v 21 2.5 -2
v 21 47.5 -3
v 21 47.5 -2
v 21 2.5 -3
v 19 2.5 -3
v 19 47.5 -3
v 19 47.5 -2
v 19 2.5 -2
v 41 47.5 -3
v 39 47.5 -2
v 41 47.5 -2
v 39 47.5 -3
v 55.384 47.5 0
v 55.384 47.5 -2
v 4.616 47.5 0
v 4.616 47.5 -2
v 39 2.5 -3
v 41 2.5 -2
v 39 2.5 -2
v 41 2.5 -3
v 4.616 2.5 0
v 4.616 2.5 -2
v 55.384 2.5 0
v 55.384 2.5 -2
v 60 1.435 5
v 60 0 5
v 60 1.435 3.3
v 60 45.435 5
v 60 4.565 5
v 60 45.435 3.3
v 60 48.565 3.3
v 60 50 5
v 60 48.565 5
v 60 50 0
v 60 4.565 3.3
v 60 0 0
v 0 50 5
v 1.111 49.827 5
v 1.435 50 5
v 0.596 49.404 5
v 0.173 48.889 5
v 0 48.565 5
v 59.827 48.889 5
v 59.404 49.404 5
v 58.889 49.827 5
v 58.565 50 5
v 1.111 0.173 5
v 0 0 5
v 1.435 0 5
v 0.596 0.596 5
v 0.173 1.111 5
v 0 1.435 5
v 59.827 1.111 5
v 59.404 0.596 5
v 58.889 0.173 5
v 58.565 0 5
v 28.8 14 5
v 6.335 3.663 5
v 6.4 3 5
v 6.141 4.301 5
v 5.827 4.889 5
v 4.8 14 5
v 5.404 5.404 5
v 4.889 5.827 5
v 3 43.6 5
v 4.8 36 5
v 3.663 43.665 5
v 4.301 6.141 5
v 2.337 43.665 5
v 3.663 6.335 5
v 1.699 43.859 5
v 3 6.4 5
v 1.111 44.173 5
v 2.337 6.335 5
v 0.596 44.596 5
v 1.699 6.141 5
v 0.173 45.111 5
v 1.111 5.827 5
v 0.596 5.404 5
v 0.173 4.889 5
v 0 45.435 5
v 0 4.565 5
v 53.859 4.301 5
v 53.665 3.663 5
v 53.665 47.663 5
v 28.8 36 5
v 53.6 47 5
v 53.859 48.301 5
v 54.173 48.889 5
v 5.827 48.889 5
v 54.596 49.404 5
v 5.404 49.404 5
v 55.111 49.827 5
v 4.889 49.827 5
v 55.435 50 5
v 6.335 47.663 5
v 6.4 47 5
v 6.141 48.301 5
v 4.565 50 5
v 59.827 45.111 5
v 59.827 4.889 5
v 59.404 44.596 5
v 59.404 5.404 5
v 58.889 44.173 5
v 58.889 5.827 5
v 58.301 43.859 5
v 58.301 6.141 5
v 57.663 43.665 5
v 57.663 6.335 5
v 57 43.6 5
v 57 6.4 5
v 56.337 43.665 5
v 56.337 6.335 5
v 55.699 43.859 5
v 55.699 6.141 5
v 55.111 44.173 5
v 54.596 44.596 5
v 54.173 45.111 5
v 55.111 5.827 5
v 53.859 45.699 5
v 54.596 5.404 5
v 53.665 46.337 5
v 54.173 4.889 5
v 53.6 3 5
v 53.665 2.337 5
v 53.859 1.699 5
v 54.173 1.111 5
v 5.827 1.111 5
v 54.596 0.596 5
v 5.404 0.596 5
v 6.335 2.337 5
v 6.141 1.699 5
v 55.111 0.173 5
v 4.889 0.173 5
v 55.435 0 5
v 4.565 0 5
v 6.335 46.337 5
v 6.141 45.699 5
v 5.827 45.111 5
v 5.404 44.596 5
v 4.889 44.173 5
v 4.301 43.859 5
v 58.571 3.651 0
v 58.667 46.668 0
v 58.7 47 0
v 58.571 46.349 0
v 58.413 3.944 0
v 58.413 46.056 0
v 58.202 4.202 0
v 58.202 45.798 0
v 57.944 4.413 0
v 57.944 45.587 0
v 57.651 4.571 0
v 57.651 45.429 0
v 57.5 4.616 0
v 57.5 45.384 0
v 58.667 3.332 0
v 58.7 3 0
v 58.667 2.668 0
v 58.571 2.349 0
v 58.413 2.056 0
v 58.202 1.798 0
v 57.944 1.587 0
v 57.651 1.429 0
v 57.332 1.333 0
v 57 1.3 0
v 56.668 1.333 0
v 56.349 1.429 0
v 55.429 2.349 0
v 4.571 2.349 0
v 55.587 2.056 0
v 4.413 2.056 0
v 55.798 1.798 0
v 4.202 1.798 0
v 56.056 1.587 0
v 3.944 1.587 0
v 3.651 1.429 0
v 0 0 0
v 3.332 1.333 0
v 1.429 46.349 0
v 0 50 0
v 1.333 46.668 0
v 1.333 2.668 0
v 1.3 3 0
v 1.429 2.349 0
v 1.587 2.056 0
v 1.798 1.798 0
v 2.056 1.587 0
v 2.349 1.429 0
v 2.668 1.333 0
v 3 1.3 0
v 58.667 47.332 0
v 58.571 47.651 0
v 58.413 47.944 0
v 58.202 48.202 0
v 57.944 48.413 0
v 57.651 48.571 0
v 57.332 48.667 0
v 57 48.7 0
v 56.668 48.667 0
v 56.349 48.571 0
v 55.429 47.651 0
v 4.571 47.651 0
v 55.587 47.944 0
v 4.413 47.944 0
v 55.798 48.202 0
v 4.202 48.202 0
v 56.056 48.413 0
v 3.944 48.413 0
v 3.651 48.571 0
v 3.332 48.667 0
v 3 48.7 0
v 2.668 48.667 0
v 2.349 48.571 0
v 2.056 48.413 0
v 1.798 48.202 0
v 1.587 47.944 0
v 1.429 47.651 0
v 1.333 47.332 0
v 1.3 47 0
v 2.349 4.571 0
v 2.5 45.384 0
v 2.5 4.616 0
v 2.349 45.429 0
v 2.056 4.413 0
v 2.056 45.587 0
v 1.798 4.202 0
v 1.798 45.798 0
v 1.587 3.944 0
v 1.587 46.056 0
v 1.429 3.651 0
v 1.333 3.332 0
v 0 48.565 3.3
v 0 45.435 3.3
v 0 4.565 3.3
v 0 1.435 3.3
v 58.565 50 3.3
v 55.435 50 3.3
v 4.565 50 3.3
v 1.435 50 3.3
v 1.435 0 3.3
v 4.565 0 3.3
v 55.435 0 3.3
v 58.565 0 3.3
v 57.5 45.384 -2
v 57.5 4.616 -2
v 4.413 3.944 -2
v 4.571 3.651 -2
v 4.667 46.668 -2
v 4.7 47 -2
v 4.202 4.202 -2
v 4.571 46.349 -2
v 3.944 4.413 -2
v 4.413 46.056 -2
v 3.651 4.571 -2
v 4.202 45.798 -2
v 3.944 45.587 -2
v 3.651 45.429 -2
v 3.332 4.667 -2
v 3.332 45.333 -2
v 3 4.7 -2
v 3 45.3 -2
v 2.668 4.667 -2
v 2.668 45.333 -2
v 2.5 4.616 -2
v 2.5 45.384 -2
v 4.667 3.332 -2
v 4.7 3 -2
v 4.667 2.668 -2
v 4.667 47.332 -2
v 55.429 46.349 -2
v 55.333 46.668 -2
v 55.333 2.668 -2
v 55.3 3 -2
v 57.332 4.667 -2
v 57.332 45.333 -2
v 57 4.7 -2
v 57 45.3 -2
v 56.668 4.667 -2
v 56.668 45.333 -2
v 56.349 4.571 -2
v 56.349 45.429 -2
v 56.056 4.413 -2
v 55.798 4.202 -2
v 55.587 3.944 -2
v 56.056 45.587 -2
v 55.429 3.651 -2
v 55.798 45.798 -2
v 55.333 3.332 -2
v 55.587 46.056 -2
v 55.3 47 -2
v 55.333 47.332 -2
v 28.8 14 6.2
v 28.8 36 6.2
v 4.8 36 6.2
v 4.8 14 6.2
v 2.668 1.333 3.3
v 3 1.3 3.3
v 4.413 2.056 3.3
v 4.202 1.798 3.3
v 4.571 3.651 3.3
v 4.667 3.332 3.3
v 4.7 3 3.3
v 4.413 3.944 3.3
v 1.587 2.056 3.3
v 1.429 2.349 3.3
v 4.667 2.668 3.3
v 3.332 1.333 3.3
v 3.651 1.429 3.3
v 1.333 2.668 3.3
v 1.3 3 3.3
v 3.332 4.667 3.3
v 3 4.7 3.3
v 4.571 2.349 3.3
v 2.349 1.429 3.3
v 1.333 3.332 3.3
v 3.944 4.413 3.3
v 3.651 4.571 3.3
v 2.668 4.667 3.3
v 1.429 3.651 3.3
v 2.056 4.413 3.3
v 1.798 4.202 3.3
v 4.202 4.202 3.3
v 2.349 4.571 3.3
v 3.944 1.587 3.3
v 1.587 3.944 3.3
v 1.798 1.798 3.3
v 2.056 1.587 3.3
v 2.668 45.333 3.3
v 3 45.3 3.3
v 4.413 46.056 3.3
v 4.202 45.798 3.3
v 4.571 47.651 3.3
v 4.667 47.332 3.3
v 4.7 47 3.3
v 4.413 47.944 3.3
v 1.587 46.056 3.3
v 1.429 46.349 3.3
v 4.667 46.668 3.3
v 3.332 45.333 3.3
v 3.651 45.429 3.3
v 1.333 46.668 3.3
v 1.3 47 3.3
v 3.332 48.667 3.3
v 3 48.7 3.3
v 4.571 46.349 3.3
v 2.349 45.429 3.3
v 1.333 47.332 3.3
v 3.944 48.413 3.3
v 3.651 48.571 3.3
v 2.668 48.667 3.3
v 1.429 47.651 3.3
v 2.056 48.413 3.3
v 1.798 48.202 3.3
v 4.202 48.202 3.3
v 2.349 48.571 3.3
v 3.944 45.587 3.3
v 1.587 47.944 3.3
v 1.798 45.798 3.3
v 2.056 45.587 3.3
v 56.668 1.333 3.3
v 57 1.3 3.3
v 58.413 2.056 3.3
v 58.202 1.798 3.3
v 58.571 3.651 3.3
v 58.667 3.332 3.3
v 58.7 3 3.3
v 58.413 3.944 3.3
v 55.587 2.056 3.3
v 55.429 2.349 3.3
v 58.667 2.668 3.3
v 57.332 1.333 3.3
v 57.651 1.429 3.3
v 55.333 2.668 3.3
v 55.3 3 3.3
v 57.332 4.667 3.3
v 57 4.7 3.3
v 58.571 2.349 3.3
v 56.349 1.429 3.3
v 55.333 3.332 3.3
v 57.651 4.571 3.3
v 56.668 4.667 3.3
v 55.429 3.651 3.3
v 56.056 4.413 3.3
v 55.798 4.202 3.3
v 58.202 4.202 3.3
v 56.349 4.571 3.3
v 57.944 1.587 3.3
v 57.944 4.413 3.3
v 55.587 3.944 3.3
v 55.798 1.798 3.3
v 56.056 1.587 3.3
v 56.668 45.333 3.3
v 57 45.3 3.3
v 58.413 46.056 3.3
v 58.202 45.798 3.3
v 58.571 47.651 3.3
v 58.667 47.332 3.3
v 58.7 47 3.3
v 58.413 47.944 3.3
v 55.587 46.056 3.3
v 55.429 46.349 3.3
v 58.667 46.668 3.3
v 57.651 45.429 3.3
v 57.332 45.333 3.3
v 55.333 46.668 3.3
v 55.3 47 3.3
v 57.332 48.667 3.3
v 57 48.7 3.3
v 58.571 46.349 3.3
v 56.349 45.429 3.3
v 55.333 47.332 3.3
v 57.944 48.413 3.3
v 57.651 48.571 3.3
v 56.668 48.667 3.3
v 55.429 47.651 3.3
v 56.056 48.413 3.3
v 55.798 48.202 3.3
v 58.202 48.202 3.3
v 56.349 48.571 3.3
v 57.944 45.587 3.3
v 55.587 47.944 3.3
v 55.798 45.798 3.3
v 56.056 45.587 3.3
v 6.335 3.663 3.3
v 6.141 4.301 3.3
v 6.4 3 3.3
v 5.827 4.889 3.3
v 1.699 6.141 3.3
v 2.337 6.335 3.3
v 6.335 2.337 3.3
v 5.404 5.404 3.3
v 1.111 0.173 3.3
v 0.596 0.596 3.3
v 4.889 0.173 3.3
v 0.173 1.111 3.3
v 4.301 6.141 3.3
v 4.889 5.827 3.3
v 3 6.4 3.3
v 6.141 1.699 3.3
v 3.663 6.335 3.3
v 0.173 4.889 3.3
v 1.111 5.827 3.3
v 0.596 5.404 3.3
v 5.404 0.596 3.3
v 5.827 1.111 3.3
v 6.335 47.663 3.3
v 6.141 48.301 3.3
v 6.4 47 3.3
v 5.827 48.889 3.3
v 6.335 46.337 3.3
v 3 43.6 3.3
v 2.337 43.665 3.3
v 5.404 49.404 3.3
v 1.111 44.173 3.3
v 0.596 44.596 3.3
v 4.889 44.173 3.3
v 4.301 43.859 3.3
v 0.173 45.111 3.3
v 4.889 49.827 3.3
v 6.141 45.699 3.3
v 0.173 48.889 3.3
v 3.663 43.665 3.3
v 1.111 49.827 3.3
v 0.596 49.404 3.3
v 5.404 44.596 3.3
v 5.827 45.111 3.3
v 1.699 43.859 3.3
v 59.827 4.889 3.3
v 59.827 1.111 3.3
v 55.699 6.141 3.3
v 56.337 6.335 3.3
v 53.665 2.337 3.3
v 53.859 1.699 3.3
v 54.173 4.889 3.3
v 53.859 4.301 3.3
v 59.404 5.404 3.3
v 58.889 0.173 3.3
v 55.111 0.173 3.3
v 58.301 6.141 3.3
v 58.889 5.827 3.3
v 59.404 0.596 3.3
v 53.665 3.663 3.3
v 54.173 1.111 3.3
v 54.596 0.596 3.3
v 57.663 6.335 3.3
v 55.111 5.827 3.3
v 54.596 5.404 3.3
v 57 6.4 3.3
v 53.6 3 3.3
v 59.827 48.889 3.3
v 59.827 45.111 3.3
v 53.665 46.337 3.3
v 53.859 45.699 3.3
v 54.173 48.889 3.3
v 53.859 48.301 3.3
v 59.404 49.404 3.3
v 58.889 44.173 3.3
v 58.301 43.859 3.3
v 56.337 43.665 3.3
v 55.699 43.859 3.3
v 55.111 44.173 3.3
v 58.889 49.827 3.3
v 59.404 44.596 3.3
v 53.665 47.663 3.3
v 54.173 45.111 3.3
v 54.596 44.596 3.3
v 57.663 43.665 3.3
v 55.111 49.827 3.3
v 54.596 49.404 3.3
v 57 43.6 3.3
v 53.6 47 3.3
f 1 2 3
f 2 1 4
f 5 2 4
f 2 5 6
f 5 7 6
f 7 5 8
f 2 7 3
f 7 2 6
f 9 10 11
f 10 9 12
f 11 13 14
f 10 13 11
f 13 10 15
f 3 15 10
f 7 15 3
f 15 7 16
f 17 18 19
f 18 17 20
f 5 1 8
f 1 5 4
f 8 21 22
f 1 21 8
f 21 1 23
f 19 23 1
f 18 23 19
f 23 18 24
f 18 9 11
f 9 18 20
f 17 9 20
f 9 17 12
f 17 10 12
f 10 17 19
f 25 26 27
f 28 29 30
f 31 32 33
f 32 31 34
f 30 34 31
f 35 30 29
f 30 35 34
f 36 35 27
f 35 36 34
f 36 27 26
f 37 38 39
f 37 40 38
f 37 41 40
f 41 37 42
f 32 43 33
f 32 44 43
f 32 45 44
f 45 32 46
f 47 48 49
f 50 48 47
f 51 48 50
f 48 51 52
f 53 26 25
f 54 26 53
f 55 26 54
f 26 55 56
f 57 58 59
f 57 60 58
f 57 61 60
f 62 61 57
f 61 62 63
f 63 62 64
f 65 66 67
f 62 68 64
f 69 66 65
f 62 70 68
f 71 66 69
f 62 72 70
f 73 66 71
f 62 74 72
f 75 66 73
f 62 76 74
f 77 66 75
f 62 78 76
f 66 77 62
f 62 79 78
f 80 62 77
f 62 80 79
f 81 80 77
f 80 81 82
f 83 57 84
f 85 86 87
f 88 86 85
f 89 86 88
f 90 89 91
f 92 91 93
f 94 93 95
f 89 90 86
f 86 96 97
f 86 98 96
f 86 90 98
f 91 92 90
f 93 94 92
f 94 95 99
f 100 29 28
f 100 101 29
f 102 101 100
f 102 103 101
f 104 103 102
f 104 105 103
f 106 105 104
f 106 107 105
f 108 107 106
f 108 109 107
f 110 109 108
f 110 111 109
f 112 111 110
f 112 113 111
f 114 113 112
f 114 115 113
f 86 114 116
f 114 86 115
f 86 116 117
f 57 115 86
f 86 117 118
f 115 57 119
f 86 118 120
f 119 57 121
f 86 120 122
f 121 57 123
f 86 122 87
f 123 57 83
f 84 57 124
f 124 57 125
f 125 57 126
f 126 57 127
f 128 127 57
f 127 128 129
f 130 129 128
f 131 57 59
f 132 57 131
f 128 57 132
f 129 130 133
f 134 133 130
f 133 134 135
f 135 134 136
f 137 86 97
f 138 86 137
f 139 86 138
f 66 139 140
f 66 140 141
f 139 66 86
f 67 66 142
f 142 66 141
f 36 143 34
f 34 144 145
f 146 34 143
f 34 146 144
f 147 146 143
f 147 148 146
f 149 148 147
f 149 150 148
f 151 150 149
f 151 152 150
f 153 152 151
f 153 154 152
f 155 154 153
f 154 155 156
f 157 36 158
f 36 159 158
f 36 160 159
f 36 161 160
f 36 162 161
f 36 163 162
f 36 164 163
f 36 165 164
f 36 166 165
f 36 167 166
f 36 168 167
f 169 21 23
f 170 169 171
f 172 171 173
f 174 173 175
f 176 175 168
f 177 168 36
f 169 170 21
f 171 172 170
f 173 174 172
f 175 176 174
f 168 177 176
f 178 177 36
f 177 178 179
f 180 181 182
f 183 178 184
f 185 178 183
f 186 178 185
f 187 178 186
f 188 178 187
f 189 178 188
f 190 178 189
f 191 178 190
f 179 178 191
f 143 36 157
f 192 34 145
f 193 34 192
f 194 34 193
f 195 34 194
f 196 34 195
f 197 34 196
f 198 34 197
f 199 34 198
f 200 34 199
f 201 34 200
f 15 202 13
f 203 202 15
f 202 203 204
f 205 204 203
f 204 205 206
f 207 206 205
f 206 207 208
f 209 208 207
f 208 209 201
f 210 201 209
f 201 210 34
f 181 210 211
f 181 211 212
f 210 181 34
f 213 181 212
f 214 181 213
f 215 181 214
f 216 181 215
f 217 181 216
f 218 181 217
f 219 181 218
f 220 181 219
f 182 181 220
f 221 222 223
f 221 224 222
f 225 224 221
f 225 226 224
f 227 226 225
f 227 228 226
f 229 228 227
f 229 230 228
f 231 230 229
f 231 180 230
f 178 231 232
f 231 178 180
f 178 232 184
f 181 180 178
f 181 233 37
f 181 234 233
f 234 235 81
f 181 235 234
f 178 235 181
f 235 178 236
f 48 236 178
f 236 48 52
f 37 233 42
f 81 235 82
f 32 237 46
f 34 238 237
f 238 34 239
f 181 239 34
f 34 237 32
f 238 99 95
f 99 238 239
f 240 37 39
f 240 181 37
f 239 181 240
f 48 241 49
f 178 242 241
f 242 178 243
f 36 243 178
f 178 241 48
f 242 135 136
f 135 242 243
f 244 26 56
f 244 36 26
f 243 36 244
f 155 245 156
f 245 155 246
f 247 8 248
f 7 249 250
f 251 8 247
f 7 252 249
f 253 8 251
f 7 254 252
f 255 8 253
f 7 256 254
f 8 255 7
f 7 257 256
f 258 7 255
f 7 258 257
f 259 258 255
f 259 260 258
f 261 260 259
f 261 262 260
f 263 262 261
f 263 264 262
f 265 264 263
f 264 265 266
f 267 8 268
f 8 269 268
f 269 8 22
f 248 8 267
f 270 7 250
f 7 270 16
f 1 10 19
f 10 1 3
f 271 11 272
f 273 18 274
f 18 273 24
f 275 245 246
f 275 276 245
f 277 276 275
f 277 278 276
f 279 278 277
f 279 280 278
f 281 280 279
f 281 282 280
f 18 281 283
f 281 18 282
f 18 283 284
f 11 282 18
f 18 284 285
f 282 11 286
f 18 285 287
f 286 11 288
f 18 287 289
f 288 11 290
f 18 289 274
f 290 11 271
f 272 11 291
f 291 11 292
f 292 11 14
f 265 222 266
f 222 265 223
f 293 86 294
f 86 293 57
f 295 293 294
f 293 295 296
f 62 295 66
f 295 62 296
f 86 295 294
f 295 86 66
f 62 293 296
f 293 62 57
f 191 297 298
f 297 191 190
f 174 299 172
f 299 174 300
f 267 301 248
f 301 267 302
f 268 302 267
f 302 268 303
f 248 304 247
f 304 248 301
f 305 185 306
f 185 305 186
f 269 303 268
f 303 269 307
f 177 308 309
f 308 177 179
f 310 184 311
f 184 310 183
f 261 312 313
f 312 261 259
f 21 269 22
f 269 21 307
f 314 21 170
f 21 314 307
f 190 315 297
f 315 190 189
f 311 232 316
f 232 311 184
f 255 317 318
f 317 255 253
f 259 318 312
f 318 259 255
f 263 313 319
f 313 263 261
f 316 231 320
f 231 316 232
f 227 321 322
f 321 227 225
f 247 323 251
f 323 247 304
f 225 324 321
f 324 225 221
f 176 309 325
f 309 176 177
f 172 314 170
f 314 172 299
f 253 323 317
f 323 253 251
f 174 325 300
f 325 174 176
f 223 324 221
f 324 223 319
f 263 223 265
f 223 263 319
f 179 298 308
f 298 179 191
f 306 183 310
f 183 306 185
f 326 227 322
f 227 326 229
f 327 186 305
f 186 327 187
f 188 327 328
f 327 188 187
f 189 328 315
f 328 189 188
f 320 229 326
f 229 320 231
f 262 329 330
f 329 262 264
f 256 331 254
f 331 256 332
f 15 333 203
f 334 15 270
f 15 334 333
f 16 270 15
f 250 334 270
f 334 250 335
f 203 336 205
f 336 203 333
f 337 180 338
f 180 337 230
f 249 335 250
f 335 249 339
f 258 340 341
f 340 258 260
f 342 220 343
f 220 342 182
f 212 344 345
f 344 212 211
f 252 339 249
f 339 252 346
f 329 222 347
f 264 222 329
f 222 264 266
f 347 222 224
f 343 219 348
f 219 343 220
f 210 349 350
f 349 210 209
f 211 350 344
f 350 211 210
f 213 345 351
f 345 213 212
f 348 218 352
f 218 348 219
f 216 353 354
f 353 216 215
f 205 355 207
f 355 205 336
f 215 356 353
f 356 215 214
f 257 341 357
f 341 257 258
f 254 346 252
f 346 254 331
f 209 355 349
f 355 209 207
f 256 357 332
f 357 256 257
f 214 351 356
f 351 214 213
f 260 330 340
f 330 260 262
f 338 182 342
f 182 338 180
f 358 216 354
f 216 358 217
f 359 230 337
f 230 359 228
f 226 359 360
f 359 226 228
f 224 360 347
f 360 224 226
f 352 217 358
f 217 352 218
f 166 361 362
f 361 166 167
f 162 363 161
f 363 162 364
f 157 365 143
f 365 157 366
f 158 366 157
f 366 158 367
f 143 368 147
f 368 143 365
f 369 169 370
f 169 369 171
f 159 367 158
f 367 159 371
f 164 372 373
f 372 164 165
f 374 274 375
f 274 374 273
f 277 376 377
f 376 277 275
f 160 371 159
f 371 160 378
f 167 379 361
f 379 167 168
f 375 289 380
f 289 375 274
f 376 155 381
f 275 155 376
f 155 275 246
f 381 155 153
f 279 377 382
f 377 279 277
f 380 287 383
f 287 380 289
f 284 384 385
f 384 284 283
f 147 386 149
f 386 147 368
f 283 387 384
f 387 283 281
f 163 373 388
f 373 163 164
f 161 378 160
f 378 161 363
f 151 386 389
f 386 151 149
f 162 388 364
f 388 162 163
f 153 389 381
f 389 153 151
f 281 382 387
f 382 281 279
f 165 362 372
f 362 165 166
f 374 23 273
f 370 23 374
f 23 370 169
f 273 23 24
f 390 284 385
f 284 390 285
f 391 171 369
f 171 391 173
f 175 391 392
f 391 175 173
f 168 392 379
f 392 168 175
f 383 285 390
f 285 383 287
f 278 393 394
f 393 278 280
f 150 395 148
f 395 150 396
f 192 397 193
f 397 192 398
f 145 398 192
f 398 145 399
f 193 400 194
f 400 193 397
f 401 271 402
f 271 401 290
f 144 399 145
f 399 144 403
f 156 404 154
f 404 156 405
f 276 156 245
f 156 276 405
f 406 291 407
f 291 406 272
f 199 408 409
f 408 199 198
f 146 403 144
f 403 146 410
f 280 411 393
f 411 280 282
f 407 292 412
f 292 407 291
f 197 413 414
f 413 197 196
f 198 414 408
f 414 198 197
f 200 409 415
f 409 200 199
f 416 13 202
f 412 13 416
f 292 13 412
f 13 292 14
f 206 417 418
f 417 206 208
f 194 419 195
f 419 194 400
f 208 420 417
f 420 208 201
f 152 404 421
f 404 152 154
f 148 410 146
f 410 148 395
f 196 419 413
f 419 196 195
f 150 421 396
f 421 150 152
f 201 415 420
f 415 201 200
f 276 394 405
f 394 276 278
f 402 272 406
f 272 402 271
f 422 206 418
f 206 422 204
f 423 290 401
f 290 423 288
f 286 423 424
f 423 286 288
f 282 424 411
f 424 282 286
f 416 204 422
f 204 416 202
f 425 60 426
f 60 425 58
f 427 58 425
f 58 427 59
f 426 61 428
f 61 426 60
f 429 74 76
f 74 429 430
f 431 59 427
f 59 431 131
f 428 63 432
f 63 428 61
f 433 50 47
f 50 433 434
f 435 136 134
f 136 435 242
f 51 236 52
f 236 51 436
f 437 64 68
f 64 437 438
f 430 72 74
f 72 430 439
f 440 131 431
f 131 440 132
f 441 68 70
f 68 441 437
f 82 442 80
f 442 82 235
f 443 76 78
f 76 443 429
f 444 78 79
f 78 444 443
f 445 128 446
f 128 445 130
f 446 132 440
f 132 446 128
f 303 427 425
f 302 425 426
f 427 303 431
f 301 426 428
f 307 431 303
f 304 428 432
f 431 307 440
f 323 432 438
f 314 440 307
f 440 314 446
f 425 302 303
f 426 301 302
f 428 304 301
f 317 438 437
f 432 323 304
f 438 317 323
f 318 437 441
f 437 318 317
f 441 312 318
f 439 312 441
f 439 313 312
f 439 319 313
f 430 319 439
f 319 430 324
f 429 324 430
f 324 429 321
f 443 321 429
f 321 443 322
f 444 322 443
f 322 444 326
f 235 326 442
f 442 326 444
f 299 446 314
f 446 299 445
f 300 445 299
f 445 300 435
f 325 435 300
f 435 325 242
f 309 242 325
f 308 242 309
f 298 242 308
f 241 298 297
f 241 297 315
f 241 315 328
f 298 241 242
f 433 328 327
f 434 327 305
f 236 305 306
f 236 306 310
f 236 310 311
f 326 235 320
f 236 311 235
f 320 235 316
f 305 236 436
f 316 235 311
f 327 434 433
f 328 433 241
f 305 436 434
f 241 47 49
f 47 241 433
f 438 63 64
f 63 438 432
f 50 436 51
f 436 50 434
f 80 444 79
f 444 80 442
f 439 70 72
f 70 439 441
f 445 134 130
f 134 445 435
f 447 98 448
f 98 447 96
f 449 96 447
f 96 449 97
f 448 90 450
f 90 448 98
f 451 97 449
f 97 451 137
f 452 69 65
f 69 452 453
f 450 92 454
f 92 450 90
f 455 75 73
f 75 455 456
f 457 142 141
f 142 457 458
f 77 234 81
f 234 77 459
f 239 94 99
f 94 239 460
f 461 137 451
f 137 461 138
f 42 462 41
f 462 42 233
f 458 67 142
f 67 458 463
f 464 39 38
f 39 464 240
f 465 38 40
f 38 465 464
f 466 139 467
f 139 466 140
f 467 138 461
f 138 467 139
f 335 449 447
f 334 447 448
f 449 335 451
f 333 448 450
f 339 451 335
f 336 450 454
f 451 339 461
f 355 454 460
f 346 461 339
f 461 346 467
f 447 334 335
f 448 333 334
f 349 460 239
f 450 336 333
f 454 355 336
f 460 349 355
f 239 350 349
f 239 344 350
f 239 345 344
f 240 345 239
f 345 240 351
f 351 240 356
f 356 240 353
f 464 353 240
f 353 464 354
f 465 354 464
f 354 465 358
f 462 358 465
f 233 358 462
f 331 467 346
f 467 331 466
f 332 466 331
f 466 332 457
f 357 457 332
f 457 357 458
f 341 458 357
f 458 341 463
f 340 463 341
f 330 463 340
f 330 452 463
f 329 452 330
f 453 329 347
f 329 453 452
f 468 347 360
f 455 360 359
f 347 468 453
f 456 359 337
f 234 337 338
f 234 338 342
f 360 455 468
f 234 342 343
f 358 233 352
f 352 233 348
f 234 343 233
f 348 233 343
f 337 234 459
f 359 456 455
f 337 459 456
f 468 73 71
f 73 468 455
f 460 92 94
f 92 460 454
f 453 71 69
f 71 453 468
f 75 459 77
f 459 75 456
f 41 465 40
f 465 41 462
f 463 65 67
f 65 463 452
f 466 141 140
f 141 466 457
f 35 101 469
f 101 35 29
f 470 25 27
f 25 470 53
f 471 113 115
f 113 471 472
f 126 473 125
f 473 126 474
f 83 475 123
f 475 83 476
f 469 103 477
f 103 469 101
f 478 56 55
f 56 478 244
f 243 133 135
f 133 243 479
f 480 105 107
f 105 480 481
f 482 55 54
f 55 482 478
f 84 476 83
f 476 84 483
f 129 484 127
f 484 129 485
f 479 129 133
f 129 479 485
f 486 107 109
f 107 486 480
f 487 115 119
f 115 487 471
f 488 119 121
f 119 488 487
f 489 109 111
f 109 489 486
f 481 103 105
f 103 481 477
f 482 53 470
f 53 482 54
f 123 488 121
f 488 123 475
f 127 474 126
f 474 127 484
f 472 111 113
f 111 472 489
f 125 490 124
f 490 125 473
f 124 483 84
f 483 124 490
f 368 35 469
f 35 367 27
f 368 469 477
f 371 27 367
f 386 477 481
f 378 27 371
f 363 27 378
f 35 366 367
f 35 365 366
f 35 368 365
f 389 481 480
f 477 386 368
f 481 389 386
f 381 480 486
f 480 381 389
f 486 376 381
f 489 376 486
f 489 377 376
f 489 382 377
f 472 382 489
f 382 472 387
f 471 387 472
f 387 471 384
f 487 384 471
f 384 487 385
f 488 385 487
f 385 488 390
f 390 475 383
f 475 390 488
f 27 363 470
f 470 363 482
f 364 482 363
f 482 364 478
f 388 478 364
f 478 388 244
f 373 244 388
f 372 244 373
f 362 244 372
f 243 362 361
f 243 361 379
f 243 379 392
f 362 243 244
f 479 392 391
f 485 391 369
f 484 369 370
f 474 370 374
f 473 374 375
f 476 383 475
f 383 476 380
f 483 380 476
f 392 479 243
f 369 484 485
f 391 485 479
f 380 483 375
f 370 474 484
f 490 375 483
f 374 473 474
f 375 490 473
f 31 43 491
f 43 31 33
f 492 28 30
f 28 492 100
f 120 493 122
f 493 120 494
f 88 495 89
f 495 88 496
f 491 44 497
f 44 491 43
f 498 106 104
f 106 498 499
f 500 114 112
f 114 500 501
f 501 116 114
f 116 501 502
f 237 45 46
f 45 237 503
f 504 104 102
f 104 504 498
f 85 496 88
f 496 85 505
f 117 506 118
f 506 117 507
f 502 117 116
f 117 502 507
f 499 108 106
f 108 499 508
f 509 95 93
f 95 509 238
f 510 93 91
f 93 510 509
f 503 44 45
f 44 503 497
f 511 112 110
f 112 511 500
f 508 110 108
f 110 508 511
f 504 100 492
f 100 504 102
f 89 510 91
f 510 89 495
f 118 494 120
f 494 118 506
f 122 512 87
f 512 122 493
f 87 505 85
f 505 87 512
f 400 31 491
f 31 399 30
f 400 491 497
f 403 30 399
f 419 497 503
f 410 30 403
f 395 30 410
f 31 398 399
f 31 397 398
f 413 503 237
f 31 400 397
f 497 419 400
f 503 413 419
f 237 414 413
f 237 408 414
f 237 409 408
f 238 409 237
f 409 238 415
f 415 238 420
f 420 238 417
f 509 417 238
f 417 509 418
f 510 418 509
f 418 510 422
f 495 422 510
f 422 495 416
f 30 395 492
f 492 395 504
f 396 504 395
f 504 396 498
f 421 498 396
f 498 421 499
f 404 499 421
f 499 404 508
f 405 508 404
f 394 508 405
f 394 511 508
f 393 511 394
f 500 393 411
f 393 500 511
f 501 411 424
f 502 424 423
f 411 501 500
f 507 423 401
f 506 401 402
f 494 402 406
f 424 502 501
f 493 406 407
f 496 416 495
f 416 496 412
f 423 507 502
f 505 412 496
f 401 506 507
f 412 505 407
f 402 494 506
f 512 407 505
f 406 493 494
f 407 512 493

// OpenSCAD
$fn = 32;

// ----------------------------------------------------------------------
// Enclosure lid: 60 x 50 x 5 mm, 4 bolt holes
// ----------------------------------------------------------------------

// --- parameters (mm) ---
length = 60;              // lid length, X
width = 50;               // lid width, Y
plate_t = 5;              // lid plate thickness
bolt_d = 3.4;             // bolt clearance
boss_lip = 3;             // bolt hole inset from the corner
sink = 1;                 // overlap of the lip and ribs into the plate
lip_h = 3;                // lip height below the plate
lip_wall = 2.5;           // lip wall thickness
cs_d = 6.8;               // countersink diameter
cs_h = 1.7;               // countersink depth
rib_n = 2;                // stiffening ribs
rib_t = 2;                // rib thickness
rib_h = 4;                // rib height below the plate
label_h = 1.2;            // raised marking pad

module plate() {
  cube([length, width, plate_t]);
  /* lip that drops into the housing opening, sunk into the plate */
  translate([lip_wall, lip_wall, -lip_h + sink]) cube([length - 2 * lip_wall, width - 2 * lip_wall, lip_h]);
  /* stiffening ribs under the plate */
  for (i = [1 : rib_n]) translate([length * i / (rib_n + 1) - rib_t / 2, lip_wall, -rib_h + sink]) cube([rib_t, width - 2 * lip_wall, rib_h]);
  /* raised marking pad on top, sunk 1 mm into the plate */
  translate([length * 0.08, width * 0.28, plate_t - 1]) cube([length * 0.4, width * 0.44, label_h + 1]);
}

difference() {
  plate();
  /* bolt pattern matching the corner bosses */
  for (sx = [0, 1]) for (sy = [0, 1])
    translate([sx * (length - 2 * boss_lip) + boss_lip, sy * (width - 2 * boss_lip) + boss_lip, -lip_h - 1])
      cylinder(h = plate_t + lip_h + 2, d = bolt_d);
  /* countersinks so the heads sit flush */
  for (sx = [0, 1]) for (sy = [0, 1])
    translate([sx * (length - 2 * boss_lip) + boss_lip, sy * (width - 2 * boss_lip) + boss_lip, plate_t - cs_h])
      cylinder(h = cs_h + 0.5, d = cs_d);
}
